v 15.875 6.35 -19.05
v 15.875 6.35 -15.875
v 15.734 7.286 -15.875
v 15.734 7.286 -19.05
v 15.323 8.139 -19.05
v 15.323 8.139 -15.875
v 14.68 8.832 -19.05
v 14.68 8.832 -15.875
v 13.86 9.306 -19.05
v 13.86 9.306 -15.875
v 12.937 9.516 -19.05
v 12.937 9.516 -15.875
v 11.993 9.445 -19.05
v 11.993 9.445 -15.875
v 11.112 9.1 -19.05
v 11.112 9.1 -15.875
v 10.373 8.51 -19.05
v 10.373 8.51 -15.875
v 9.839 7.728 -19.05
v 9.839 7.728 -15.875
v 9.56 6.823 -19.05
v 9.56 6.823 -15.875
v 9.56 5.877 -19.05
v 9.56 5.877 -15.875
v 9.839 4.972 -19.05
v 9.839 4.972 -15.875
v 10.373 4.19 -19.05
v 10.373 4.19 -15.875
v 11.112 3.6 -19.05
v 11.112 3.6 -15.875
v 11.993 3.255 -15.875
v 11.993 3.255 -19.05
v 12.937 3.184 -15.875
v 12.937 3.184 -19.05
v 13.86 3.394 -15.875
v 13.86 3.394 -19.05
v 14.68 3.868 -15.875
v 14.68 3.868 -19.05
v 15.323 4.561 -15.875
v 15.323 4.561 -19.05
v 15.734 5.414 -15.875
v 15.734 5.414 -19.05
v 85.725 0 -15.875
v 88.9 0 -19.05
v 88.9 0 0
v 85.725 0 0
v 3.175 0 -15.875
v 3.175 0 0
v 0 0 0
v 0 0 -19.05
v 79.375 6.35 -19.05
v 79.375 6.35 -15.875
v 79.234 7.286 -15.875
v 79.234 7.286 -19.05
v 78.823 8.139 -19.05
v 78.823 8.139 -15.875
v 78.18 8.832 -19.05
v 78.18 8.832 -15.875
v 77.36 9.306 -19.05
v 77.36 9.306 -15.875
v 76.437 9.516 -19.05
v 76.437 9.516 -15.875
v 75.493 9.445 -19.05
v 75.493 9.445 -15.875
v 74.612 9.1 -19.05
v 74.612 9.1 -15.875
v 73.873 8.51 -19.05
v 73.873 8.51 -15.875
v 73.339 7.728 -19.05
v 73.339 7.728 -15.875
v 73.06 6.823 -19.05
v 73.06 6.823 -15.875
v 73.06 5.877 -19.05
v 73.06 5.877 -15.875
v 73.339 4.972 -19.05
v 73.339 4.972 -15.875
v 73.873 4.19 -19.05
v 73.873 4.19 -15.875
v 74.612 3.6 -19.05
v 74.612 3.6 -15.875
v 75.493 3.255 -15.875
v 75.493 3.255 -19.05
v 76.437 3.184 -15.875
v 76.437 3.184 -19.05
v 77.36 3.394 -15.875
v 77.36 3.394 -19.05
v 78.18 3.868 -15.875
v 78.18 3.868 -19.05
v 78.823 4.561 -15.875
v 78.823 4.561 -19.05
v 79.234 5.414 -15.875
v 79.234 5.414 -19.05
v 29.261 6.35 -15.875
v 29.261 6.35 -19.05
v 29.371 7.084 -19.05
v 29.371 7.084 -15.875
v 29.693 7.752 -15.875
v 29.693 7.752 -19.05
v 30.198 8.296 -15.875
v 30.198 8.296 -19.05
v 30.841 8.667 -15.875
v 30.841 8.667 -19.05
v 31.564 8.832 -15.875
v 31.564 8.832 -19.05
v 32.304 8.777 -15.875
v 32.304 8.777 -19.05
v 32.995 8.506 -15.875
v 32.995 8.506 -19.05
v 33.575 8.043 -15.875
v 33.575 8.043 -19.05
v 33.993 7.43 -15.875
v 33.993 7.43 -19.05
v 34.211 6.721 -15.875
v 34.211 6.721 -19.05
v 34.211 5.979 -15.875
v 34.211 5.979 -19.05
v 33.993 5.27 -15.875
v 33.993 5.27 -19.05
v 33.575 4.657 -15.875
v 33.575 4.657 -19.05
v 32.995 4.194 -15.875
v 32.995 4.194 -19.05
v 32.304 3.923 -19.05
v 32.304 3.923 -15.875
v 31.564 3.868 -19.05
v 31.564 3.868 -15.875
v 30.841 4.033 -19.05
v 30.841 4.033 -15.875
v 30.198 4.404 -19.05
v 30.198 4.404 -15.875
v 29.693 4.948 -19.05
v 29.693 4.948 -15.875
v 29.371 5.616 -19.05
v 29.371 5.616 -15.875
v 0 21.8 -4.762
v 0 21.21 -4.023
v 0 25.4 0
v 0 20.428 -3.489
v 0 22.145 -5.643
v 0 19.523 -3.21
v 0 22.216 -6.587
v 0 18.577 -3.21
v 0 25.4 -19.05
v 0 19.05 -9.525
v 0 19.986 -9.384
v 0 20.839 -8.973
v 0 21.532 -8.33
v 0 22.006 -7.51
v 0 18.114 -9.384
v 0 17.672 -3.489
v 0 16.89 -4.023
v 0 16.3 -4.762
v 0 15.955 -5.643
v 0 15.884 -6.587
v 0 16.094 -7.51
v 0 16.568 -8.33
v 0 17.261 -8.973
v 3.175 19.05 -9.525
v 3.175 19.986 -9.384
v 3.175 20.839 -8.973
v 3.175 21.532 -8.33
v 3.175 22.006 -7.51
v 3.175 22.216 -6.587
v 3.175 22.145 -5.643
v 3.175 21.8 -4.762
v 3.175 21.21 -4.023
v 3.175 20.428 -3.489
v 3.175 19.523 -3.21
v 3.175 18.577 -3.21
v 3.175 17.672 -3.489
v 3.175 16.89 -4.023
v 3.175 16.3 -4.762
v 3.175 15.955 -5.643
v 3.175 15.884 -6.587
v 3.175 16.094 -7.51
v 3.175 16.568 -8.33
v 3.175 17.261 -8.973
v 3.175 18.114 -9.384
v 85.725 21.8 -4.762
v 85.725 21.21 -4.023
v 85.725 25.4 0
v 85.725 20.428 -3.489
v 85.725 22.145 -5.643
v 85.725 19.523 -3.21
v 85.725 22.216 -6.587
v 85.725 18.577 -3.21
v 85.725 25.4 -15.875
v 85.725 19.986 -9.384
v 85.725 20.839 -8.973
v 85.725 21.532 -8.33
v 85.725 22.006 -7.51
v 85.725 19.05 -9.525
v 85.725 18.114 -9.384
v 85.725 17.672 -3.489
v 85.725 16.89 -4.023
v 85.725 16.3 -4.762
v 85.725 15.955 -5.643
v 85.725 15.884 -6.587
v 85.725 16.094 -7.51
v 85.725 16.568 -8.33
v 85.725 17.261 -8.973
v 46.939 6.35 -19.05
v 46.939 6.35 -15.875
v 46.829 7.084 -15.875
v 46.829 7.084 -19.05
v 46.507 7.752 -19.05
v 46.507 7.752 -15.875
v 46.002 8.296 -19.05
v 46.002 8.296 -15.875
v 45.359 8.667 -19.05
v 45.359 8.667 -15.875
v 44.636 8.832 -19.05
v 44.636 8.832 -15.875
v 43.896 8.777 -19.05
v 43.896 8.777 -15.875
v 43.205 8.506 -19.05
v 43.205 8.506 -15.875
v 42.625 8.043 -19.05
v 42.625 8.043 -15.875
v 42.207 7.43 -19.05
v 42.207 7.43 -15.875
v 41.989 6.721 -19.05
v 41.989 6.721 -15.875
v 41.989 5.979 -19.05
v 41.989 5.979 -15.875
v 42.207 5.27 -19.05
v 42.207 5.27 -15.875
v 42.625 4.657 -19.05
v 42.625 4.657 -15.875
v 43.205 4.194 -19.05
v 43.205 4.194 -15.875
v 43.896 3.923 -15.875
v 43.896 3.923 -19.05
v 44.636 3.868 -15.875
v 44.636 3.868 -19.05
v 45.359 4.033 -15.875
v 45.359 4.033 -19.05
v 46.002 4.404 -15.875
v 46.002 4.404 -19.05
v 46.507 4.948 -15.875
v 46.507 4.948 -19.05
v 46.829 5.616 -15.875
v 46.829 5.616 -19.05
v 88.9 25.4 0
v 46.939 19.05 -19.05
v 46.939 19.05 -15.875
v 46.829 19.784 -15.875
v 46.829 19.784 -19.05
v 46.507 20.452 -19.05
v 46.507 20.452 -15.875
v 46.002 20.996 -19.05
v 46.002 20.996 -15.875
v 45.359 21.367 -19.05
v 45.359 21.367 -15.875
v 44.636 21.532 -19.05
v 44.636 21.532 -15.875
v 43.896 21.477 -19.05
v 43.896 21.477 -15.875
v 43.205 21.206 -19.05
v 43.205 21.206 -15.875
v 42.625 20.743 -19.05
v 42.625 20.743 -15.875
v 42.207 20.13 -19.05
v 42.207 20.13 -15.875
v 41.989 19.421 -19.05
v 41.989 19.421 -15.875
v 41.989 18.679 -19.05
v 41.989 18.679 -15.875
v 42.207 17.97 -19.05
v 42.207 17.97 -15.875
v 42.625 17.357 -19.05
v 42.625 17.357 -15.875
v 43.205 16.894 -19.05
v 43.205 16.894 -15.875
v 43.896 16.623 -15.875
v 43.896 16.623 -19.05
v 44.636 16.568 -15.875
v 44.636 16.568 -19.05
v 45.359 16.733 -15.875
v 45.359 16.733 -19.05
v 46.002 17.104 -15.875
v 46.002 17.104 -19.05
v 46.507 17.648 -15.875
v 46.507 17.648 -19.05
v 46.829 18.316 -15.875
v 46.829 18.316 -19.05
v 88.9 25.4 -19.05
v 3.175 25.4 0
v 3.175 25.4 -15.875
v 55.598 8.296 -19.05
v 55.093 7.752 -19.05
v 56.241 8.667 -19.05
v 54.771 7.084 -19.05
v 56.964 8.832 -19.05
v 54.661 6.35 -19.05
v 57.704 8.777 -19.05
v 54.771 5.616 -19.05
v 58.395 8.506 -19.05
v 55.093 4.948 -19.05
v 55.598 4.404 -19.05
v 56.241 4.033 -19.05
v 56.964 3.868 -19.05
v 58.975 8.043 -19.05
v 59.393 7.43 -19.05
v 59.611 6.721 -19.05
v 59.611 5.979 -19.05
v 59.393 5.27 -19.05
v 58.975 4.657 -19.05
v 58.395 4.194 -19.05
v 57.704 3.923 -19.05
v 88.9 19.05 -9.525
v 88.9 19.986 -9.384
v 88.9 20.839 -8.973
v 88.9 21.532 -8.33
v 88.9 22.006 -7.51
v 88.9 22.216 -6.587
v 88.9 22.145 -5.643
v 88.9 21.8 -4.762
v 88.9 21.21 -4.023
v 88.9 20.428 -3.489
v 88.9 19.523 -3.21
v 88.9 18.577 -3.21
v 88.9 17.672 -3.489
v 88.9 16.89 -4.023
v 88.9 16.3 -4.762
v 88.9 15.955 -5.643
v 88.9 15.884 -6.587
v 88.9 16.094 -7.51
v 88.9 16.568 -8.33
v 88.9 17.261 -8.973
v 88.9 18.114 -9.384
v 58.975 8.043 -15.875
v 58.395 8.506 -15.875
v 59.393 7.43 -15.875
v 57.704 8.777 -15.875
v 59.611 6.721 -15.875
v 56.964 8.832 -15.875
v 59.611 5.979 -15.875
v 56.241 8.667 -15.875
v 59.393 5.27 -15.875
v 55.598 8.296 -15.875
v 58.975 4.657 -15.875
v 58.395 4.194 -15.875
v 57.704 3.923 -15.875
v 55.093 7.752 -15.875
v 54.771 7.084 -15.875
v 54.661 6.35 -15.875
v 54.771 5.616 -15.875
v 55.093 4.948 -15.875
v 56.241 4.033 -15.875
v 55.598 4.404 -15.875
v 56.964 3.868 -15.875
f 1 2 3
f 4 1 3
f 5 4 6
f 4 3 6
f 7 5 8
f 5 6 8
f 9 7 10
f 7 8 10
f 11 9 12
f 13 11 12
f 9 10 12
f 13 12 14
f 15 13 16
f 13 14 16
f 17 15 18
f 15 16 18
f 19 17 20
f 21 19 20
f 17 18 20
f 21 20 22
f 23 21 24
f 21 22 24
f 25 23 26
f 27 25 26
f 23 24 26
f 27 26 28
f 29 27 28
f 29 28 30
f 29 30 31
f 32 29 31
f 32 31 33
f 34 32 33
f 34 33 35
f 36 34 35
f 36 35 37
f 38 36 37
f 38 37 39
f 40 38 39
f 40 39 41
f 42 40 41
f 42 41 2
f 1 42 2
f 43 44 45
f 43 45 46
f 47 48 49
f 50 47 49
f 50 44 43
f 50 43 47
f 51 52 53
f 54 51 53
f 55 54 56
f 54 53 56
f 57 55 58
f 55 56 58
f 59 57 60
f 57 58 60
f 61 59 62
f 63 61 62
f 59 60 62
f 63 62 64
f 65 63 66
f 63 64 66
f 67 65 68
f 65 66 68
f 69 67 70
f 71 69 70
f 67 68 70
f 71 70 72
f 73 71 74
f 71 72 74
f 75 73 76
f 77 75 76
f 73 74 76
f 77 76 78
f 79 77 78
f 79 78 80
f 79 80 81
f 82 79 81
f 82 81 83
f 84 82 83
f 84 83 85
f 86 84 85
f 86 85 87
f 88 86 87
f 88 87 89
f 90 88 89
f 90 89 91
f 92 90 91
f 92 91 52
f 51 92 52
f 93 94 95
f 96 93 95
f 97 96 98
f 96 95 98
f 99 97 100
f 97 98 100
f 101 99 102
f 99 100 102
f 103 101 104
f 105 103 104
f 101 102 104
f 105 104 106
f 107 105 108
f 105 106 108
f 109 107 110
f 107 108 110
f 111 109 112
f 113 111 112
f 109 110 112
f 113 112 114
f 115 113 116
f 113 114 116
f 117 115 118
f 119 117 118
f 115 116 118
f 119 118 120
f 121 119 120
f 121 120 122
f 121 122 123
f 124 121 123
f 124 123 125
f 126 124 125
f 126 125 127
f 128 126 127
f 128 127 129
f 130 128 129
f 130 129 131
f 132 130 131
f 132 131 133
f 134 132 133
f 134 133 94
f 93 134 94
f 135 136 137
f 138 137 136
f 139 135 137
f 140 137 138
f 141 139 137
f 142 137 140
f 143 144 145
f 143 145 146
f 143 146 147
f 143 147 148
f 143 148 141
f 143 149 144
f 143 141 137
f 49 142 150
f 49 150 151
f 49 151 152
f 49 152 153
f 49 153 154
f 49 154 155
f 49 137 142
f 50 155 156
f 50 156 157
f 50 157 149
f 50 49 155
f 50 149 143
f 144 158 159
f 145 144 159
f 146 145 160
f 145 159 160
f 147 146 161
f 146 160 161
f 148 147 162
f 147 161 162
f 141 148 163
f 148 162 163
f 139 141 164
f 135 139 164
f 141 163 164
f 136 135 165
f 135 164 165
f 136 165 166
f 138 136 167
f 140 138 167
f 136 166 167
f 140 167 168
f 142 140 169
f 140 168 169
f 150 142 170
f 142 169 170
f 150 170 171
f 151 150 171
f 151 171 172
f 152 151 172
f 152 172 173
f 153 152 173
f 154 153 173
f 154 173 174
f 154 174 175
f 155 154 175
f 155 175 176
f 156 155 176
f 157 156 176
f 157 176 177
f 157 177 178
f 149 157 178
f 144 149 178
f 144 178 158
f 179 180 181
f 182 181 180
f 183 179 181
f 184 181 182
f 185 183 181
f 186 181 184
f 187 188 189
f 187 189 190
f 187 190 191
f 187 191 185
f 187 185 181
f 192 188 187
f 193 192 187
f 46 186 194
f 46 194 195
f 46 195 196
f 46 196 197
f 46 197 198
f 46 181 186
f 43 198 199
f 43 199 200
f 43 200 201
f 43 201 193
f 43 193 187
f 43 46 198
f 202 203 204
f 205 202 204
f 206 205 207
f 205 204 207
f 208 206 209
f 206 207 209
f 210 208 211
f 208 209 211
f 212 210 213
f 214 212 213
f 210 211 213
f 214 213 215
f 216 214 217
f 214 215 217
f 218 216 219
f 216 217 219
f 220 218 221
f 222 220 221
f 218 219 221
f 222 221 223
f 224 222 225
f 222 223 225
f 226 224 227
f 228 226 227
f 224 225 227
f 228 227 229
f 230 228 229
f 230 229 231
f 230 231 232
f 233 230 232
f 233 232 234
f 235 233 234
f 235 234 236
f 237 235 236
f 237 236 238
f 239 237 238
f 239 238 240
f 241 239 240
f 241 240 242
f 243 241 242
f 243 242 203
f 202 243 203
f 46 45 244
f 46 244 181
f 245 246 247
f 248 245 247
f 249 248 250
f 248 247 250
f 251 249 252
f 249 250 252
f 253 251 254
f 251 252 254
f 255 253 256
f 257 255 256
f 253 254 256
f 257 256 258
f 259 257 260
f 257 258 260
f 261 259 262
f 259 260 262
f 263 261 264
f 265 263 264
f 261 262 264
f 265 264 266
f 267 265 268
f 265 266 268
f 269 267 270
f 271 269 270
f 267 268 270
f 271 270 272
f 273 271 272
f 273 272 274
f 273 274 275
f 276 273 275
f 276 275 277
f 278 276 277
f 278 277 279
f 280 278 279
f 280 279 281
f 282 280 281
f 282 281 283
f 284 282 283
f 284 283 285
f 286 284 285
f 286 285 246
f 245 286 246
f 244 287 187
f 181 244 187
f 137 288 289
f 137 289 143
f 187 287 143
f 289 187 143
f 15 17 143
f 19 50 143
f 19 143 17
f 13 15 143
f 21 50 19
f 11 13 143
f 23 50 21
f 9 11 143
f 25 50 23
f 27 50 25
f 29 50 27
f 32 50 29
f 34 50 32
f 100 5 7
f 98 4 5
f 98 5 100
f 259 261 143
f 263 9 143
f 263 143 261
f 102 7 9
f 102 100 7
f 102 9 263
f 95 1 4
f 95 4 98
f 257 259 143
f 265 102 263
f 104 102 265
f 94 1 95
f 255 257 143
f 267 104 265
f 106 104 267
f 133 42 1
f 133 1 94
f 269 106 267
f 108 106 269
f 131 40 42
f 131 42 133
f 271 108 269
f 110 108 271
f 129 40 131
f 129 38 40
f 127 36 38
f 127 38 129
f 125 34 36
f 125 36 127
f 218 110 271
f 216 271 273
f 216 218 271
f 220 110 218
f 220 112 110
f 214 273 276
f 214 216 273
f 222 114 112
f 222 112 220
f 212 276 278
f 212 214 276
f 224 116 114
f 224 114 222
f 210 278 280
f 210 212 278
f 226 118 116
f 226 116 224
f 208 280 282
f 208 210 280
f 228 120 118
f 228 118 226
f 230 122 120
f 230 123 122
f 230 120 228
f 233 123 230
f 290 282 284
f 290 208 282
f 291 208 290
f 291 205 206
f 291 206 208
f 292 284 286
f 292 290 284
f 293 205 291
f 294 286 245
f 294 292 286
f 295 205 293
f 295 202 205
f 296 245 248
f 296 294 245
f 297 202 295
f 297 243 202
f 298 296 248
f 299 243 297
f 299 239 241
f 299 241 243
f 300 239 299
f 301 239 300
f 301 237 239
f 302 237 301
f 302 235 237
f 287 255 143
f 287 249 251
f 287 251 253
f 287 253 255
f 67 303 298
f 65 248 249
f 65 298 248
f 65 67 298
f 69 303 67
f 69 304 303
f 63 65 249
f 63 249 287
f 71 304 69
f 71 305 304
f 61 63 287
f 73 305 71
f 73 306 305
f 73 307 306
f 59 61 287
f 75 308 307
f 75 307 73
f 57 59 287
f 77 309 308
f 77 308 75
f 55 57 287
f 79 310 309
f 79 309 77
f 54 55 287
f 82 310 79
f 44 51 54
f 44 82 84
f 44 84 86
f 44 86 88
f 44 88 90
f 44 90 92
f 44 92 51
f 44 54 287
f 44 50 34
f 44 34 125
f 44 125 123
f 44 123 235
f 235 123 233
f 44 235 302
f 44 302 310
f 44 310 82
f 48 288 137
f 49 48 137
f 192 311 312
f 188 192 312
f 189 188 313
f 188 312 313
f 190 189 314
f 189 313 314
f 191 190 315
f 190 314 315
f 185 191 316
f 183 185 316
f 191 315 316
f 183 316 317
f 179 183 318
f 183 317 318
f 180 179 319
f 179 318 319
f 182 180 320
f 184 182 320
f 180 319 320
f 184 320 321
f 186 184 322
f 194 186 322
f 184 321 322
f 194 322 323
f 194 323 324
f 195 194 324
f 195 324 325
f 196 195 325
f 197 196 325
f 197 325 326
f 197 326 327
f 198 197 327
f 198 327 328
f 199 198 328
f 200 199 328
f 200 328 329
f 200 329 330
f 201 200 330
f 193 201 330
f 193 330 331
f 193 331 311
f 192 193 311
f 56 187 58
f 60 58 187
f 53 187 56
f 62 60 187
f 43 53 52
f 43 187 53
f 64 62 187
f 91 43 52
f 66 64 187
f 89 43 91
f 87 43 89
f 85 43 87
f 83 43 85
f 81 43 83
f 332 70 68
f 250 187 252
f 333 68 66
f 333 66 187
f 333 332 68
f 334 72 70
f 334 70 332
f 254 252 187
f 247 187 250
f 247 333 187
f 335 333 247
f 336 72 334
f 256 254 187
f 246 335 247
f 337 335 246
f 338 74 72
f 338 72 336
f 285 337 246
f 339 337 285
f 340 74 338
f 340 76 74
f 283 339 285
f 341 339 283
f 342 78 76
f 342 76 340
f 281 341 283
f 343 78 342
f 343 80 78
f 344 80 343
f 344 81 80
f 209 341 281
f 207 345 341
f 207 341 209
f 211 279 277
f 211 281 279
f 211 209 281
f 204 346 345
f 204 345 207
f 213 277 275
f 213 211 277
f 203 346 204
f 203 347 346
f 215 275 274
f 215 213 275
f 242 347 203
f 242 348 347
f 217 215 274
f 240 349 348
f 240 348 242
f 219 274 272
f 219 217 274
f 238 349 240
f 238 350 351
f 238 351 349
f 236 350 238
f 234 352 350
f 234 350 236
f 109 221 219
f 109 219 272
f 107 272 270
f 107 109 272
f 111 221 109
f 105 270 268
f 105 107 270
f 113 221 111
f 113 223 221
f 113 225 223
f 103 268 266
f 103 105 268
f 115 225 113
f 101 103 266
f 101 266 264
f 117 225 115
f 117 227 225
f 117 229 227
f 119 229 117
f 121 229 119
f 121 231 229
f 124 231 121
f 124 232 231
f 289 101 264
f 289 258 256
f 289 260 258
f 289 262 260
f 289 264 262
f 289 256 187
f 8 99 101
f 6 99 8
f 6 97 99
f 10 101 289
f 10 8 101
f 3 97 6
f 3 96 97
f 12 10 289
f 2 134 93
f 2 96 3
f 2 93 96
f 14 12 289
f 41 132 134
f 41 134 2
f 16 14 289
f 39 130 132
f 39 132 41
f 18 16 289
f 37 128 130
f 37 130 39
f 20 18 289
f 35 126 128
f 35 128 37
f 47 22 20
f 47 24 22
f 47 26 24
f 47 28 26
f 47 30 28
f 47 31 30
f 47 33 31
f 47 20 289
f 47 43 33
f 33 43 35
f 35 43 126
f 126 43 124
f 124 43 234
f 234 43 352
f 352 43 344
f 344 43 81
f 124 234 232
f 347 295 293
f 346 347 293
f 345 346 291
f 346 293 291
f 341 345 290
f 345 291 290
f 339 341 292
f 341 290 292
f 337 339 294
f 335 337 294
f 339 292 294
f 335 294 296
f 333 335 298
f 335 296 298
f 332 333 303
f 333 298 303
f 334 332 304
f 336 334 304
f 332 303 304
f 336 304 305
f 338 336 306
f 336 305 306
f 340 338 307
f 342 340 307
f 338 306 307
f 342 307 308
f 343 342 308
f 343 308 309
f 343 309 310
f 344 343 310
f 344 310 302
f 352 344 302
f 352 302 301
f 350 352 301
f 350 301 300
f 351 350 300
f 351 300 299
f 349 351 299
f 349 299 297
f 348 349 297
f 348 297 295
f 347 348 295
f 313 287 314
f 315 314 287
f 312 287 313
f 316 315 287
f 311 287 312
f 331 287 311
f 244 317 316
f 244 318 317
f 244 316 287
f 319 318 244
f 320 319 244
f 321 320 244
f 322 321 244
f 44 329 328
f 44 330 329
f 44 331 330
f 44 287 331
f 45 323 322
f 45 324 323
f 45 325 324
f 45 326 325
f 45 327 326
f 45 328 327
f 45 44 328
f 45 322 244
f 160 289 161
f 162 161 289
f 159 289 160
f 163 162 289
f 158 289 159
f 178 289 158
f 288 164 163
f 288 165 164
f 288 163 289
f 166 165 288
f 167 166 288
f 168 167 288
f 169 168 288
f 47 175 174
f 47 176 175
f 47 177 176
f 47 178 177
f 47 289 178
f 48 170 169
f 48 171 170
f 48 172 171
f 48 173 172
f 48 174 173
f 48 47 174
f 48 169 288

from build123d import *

# Parameters (mm, degrees)
BOSS_EXTRUDE1_DEPTH     = 25.4
SKETCH2_R               = 3.175
CUT_EXTRUDE1_DEPTH      = 89.9
SKETCH3_R               = 3.175
CUT_EXTRUDE2_DEPTH      = 16.875
CUT_EXTRUDE2_DEPTH_BACK = 4.175
SKETCH4_R               = 2.4892
CUT_EXTRUDE3_DEPTH      = 4.175
SKETCH5_R               = 2.4892
CUT_EXTRUDE4_DEPTH      = 20.05


with BuildPart() as part:
    # Sketch1 → Boss-Extrude1 (new body)
    with BuildSketch(Plane(origin=(0, 0, 0), x_dir=(1, 0, 0), z_dir=(0, 1, 0))):
        Polygon((0, 0), (0, 19.05), (88.9, 19.05), (88.9, 0), (85.725, 0), (85.725, 15.875), (3.175, 15.875), (3.175, 0), align=None)
    extrude(amount=BOSS_EXTRUDE1_DEPTH)

    # Sketch2 → Cut-Extrude1 (cut, through all)
    with BuildSketch(Plane(origin=(88.9, 0, 0), x_dir=(0, 0, -1), z_dir=(1, 0, 0))):
        with Locations((6.35, 19.05)):
            Circle(SKETCH2_R)
    extrude(amount=-CUT_EXTRUDE1_DEPTH, mode=Mode.SUBTRACT)

    # Sketch3 → Cut-Extrude2 (cut, two sides)
    with BuildSketch(Plane.XY.offset(-15.875)) as cut_extrude2_sk:
        with Locations((12.7, 6.35)):
            Circle(SKETCH3_R)
        with Locations((76.2, 6.35)):
            Circle(SKETCH3_R)
    extrude(amount=CUT_EXTRUDE2_DEPTH, mode=Mode.SUBTRACT)
    extrude(cut_extrude2_sk.sketch, amount=-CUT_EXTRUDE2_DEPTH_BACK, mode=Mode.SUBTRACT)

    # Sketch4 → Cut-Extrude3 (cut, through all)
    with BuildSketch(Plane.XY.offset(-15.875)):
        with Locations((44.45, 19.05)):
            Circle(SKETCH4_R)
        with Locations((44.45, 6.35)):
            Circle(SKETCH4_R)
    extrude(amount=-CUT_EXTRUDE3_DEPTH, mode=Mode.SUBTRACT)

    # Sketch5 → Cut-Extrude4 (cut, through all)
    with BuildSketch(Plane(origin=(0, 0, -19.05), x_dir=(-1, 0, 0), z_dir=(0, 0, -1))):
        with Locations((-31.75, 6.35)):
            Circle(SKETCH5_R)
        with Locations((-57.15, 6.35)):
            Circle(SKETCH5_R)
    extrude(amount=-CUT_EXTRUDE4_DEPTH, mode=Mode.SUBTRACT)


solid = part.part
